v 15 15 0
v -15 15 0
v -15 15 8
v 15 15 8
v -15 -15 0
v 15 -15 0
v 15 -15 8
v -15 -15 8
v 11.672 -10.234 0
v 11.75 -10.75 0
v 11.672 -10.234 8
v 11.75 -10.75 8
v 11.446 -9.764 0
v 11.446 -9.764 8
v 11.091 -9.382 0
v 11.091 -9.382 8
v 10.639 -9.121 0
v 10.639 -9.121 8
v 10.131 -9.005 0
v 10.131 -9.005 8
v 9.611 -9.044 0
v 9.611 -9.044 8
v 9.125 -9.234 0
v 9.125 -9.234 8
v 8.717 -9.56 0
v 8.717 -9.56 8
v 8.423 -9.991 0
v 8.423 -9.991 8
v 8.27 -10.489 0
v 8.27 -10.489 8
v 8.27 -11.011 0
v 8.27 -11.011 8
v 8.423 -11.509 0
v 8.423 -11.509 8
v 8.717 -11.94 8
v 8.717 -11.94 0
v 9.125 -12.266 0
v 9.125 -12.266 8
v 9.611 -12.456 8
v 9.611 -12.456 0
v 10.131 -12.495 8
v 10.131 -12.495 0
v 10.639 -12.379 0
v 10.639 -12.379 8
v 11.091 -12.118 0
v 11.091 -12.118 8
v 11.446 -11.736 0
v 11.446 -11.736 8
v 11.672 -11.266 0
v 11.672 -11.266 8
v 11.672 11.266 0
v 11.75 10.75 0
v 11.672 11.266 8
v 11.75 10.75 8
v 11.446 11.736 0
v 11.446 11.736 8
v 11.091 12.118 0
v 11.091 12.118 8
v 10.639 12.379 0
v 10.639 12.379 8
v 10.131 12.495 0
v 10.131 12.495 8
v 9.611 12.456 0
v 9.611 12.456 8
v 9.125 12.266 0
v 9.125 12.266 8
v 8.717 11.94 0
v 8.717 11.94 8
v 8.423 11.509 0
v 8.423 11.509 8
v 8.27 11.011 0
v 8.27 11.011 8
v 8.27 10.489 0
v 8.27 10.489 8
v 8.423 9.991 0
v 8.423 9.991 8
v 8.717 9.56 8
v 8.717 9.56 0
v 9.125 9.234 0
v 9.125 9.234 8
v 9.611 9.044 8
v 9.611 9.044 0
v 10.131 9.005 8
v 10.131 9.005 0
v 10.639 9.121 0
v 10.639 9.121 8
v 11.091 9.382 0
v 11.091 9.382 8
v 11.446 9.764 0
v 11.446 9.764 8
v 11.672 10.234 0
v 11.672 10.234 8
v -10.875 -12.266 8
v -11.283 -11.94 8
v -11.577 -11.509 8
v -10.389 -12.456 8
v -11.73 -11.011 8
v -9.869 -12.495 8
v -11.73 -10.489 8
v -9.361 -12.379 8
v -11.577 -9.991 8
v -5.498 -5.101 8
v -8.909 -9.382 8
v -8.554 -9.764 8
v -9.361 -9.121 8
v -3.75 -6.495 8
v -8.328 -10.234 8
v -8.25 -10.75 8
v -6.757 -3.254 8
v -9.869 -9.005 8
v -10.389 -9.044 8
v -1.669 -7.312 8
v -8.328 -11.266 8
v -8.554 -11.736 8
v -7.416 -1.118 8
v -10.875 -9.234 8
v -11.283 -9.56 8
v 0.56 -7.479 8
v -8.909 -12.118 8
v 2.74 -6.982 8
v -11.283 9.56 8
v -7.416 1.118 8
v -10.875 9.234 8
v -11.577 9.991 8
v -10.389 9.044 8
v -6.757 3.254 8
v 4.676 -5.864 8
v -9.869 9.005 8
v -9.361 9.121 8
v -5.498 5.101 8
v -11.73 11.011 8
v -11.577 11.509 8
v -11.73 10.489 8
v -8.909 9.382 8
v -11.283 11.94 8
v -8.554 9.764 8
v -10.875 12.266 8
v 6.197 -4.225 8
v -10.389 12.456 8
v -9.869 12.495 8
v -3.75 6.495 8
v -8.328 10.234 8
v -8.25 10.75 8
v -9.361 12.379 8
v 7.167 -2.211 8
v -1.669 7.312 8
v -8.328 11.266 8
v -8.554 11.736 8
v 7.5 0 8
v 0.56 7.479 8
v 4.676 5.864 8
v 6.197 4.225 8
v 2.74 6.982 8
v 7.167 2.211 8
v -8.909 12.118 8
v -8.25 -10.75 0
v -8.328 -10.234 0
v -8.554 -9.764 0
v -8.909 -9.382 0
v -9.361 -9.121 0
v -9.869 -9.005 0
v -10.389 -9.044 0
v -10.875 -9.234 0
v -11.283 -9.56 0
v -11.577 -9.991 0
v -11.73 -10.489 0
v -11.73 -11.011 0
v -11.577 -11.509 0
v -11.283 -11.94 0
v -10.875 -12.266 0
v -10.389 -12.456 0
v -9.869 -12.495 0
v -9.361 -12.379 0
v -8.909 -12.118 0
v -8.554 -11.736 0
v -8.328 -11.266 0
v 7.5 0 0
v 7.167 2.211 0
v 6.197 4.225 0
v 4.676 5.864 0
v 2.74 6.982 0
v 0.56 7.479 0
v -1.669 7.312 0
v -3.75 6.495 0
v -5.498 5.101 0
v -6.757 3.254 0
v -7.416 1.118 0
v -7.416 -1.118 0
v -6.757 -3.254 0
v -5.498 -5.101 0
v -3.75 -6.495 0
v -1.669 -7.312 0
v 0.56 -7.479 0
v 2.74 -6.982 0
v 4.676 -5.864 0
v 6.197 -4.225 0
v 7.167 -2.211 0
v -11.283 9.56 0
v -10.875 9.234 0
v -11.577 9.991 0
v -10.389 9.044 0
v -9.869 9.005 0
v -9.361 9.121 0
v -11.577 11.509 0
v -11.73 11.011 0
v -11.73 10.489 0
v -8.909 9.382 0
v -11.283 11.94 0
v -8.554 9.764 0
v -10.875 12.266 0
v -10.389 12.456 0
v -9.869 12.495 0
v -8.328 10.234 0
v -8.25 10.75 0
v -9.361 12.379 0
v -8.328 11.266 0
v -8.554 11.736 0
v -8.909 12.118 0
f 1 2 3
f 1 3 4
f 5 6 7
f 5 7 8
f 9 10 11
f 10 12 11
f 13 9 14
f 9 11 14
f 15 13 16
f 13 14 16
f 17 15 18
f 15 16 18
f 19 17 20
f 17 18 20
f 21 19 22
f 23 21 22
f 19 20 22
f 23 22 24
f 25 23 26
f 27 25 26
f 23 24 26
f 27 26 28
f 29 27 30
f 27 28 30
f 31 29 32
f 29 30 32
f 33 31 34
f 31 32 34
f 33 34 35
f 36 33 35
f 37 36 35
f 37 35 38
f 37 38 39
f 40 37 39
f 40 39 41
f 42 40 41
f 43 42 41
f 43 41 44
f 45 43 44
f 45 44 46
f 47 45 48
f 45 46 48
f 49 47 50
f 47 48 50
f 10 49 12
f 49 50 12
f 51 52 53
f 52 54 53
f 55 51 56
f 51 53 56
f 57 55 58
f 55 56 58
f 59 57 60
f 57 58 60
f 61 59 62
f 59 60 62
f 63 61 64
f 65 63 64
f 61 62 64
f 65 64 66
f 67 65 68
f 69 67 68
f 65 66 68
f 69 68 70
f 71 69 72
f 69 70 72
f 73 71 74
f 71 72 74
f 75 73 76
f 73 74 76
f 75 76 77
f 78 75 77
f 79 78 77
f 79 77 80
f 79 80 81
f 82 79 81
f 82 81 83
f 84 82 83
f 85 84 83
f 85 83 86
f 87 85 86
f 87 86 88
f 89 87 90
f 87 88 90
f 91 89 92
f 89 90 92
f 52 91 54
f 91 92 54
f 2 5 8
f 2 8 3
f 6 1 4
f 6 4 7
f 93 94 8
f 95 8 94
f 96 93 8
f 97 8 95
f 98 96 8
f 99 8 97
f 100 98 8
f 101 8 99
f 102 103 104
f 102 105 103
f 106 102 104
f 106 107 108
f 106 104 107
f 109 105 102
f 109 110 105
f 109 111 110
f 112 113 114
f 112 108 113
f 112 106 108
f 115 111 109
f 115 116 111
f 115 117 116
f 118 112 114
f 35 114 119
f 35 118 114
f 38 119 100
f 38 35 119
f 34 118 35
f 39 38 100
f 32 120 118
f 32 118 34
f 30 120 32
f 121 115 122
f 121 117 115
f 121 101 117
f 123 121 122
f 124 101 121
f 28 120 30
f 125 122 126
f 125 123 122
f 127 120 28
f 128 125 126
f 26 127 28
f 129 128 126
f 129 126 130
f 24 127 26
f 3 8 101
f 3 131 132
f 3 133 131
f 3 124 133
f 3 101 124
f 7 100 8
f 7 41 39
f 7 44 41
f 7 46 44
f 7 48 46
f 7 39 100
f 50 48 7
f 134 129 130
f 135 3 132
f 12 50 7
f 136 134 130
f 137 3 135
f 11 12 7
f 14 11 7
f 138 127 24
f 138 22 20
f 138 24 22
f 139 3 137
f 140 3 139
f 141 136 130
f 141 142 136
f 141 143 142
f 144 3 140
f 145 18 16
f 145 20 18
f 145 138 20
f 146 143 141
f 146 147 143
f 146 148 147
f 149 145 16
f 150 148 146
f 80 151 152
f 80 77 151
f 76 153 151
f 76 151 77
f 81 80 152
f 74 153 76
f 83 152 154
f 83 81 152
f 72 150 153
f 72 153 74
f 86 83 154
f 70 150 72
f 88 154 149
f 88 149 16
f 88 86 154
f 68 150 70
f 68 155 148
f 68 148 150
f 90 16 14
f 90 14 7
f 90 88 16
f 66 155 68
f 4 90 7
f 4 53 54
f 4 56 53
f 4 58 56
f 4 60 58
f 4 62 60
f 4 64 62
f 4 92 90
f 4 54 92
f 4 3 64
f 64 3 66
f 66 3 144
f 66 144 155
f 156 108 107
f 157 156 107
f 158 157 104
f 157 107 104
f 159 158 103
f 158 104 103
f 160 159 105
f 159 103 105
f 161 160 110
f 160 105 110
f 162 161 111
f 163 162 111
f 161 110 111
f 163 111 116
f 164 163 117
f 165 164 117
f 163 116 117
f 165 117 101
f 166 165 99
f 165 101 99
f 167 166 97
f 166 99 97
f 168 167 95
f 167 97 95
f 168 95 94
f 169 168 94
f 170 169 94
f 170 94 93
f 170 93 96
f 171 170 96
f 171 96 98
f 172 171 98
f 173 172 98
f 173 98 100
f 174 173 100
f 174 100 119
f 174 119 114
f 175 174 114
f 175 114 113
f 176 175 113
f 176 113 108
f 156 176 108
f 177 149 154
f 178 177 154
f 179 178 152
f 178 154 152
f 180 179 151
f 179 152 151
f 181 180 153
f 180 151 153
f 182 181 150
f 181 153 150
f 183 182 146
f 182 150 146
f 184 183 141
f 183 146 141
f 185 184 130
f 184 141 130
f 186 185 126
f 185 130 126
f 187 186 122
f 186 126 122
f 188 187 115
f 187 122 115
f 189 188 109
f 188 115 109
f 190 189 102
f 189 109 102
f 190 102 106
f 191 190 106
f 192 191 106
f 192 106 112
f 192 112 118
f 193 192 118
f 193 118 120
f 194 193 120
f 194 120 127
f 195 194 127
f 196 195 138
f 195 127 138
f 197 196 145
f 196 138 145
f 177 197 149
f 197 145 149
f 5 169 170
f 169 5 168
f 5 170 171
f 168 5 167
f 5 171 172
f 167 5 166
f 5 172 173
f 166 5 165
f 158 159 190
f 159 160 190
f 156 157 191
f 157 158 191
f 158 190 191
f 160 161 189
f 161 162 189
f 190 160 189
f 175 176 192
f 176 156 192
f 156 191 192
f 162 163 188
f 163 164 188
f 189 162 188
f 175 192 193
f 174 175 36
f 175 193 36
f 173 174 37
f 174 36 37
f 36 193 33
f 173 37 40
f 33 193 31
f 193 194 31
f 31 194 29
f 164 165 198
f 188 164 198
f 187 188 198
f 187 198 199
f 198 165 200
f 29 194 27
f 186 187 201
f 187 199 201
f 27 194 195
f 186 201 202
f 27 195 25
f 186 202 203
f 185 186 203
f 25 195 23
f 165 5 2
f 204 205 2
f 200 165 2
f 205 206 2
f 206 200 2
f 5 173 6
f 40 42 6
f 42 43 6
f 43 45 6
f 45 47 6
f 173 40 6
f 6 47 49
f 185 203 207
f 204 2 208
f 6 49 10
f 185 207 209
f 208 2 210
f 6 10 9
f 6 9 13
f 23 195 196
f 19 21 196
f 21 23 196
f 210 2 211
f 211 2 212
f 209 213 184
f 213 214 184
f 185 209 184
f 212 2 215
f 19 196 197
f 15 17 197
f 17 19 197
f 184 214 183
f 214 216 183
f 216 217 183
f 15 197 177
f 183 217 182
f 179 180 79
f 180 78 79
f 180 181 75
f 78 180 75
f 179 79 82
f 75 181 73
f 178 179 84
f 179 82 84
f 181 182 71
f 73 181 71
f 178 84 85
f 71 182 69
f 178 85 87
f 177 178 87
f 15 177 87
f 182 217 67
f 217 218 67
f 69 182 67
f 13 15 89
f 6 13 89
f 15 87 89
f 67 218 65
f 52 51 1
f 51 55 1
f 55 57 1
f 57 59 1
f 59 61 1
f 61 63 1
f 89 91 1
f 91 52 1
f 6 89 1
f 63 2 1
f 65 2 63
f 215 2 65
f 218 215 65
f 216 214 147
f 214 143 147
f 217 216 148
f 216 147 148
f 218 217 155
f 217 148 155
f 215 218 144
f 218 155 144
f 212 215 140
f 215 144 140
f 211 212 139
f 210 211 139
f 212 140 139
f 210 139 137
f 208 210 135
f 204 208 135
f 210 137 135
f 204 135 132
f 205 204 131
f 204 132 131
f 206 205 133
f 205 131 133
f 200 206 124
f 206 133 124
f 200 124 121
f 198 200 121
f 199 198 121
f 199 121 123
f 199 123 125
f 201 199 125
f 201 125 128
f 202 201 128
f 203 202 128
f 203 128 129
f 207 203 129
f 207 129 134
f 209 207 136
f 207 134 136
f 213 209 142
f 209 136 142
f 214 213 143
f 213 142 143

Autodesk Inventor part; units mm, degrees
ref_plane "YZ Plane" through (0, 0, 0) normal (1, 0, 0) x (0, 1, 0)
ref_plane "XZ Plane" through (0, 0, 0) normal (0, 1, 0) x (-1, 0, 0)
ref_plane "XY Plane" through (0, 0, 0) normal (0, 0, 1) x (1, 0, 0)
sketch "Sketch1" plane through (0, 0, 0) normal (0, 0, 1) x (1, 0, 0)
  line L0 (-15, 15) -> (15, 15)
  line L1 (15, 15) -> (15, -15)
  line L2 (15, -15) -> (-15, -15)
  line L3 (-15, -15) -> (-15, 15)
  point P0 (0, 0)
  point P1 (0, 15)
  point P2 (-15, 0)
  dimension "d0" = 30
  dimension "d1" = 30
extrude "Extrusion1" add sketch "Sketch1" along normal blind 8
sketch "Sketch2" plane through (0, 0, 8) normal (0, 0, 1) x (1, 0, 0)
  circle A0 centre (0, 0) radius 7.5
  line L0 (15, 15) -> (-15, 15) projected
  line L1 (-15, 15) -> (-15, -15) projected
  point P0 (0, 15)
  point P1 (-15, 0)
  dimension "d17" = 15
extrude "Extrusion2" cut sketch "Sketch2" against normal through all
sketch "Sketch3" plane through (0, 0, 8) normal (0, 0, 1) x (1, 0, 0)
  circle A0 centre (10, -10.75) radius 1.75
  circle A1 centre (10, 10.75) radius 1.75
  line L0 (15, 15) -> (-15, 15) projected
  line L1 (15, -15) -> (15, 15) projected
  circle A2 centre (-10, -10.75) radius 1.75
  circle A3 centre (-10, 10.75) radius 1.75
  line L2 (-15, 15) -> (-15, -15) projected
  line L3 (-15, -15) -> (15, -15) projected
  line L4 (10, 10.75) -> (-10, 10.75) construction
  line L5 (-10, 10.75) -> (-10, -10.75) construction
  line L6 (-10, -10.75) -> (10, -10.75) construction
  line L7 (10, -10.75) -> (10, 10.75) construction
  point P0 (0, 0)
  point P1 (10, 0)
  point P2 (0, 10.75)
  dimension "d9" = 3.5
  dimension "d19" = 10.75
  dimension "d20" = 10.75
  dimension "d21" = 20
  dimension "d22" = 21.5
extrude "Extrusion3" cut sketch "Sketch3" against normal through all contours A0 | A1 | A2 | A3
properties part number "0005-10-006 Capac rulment"
